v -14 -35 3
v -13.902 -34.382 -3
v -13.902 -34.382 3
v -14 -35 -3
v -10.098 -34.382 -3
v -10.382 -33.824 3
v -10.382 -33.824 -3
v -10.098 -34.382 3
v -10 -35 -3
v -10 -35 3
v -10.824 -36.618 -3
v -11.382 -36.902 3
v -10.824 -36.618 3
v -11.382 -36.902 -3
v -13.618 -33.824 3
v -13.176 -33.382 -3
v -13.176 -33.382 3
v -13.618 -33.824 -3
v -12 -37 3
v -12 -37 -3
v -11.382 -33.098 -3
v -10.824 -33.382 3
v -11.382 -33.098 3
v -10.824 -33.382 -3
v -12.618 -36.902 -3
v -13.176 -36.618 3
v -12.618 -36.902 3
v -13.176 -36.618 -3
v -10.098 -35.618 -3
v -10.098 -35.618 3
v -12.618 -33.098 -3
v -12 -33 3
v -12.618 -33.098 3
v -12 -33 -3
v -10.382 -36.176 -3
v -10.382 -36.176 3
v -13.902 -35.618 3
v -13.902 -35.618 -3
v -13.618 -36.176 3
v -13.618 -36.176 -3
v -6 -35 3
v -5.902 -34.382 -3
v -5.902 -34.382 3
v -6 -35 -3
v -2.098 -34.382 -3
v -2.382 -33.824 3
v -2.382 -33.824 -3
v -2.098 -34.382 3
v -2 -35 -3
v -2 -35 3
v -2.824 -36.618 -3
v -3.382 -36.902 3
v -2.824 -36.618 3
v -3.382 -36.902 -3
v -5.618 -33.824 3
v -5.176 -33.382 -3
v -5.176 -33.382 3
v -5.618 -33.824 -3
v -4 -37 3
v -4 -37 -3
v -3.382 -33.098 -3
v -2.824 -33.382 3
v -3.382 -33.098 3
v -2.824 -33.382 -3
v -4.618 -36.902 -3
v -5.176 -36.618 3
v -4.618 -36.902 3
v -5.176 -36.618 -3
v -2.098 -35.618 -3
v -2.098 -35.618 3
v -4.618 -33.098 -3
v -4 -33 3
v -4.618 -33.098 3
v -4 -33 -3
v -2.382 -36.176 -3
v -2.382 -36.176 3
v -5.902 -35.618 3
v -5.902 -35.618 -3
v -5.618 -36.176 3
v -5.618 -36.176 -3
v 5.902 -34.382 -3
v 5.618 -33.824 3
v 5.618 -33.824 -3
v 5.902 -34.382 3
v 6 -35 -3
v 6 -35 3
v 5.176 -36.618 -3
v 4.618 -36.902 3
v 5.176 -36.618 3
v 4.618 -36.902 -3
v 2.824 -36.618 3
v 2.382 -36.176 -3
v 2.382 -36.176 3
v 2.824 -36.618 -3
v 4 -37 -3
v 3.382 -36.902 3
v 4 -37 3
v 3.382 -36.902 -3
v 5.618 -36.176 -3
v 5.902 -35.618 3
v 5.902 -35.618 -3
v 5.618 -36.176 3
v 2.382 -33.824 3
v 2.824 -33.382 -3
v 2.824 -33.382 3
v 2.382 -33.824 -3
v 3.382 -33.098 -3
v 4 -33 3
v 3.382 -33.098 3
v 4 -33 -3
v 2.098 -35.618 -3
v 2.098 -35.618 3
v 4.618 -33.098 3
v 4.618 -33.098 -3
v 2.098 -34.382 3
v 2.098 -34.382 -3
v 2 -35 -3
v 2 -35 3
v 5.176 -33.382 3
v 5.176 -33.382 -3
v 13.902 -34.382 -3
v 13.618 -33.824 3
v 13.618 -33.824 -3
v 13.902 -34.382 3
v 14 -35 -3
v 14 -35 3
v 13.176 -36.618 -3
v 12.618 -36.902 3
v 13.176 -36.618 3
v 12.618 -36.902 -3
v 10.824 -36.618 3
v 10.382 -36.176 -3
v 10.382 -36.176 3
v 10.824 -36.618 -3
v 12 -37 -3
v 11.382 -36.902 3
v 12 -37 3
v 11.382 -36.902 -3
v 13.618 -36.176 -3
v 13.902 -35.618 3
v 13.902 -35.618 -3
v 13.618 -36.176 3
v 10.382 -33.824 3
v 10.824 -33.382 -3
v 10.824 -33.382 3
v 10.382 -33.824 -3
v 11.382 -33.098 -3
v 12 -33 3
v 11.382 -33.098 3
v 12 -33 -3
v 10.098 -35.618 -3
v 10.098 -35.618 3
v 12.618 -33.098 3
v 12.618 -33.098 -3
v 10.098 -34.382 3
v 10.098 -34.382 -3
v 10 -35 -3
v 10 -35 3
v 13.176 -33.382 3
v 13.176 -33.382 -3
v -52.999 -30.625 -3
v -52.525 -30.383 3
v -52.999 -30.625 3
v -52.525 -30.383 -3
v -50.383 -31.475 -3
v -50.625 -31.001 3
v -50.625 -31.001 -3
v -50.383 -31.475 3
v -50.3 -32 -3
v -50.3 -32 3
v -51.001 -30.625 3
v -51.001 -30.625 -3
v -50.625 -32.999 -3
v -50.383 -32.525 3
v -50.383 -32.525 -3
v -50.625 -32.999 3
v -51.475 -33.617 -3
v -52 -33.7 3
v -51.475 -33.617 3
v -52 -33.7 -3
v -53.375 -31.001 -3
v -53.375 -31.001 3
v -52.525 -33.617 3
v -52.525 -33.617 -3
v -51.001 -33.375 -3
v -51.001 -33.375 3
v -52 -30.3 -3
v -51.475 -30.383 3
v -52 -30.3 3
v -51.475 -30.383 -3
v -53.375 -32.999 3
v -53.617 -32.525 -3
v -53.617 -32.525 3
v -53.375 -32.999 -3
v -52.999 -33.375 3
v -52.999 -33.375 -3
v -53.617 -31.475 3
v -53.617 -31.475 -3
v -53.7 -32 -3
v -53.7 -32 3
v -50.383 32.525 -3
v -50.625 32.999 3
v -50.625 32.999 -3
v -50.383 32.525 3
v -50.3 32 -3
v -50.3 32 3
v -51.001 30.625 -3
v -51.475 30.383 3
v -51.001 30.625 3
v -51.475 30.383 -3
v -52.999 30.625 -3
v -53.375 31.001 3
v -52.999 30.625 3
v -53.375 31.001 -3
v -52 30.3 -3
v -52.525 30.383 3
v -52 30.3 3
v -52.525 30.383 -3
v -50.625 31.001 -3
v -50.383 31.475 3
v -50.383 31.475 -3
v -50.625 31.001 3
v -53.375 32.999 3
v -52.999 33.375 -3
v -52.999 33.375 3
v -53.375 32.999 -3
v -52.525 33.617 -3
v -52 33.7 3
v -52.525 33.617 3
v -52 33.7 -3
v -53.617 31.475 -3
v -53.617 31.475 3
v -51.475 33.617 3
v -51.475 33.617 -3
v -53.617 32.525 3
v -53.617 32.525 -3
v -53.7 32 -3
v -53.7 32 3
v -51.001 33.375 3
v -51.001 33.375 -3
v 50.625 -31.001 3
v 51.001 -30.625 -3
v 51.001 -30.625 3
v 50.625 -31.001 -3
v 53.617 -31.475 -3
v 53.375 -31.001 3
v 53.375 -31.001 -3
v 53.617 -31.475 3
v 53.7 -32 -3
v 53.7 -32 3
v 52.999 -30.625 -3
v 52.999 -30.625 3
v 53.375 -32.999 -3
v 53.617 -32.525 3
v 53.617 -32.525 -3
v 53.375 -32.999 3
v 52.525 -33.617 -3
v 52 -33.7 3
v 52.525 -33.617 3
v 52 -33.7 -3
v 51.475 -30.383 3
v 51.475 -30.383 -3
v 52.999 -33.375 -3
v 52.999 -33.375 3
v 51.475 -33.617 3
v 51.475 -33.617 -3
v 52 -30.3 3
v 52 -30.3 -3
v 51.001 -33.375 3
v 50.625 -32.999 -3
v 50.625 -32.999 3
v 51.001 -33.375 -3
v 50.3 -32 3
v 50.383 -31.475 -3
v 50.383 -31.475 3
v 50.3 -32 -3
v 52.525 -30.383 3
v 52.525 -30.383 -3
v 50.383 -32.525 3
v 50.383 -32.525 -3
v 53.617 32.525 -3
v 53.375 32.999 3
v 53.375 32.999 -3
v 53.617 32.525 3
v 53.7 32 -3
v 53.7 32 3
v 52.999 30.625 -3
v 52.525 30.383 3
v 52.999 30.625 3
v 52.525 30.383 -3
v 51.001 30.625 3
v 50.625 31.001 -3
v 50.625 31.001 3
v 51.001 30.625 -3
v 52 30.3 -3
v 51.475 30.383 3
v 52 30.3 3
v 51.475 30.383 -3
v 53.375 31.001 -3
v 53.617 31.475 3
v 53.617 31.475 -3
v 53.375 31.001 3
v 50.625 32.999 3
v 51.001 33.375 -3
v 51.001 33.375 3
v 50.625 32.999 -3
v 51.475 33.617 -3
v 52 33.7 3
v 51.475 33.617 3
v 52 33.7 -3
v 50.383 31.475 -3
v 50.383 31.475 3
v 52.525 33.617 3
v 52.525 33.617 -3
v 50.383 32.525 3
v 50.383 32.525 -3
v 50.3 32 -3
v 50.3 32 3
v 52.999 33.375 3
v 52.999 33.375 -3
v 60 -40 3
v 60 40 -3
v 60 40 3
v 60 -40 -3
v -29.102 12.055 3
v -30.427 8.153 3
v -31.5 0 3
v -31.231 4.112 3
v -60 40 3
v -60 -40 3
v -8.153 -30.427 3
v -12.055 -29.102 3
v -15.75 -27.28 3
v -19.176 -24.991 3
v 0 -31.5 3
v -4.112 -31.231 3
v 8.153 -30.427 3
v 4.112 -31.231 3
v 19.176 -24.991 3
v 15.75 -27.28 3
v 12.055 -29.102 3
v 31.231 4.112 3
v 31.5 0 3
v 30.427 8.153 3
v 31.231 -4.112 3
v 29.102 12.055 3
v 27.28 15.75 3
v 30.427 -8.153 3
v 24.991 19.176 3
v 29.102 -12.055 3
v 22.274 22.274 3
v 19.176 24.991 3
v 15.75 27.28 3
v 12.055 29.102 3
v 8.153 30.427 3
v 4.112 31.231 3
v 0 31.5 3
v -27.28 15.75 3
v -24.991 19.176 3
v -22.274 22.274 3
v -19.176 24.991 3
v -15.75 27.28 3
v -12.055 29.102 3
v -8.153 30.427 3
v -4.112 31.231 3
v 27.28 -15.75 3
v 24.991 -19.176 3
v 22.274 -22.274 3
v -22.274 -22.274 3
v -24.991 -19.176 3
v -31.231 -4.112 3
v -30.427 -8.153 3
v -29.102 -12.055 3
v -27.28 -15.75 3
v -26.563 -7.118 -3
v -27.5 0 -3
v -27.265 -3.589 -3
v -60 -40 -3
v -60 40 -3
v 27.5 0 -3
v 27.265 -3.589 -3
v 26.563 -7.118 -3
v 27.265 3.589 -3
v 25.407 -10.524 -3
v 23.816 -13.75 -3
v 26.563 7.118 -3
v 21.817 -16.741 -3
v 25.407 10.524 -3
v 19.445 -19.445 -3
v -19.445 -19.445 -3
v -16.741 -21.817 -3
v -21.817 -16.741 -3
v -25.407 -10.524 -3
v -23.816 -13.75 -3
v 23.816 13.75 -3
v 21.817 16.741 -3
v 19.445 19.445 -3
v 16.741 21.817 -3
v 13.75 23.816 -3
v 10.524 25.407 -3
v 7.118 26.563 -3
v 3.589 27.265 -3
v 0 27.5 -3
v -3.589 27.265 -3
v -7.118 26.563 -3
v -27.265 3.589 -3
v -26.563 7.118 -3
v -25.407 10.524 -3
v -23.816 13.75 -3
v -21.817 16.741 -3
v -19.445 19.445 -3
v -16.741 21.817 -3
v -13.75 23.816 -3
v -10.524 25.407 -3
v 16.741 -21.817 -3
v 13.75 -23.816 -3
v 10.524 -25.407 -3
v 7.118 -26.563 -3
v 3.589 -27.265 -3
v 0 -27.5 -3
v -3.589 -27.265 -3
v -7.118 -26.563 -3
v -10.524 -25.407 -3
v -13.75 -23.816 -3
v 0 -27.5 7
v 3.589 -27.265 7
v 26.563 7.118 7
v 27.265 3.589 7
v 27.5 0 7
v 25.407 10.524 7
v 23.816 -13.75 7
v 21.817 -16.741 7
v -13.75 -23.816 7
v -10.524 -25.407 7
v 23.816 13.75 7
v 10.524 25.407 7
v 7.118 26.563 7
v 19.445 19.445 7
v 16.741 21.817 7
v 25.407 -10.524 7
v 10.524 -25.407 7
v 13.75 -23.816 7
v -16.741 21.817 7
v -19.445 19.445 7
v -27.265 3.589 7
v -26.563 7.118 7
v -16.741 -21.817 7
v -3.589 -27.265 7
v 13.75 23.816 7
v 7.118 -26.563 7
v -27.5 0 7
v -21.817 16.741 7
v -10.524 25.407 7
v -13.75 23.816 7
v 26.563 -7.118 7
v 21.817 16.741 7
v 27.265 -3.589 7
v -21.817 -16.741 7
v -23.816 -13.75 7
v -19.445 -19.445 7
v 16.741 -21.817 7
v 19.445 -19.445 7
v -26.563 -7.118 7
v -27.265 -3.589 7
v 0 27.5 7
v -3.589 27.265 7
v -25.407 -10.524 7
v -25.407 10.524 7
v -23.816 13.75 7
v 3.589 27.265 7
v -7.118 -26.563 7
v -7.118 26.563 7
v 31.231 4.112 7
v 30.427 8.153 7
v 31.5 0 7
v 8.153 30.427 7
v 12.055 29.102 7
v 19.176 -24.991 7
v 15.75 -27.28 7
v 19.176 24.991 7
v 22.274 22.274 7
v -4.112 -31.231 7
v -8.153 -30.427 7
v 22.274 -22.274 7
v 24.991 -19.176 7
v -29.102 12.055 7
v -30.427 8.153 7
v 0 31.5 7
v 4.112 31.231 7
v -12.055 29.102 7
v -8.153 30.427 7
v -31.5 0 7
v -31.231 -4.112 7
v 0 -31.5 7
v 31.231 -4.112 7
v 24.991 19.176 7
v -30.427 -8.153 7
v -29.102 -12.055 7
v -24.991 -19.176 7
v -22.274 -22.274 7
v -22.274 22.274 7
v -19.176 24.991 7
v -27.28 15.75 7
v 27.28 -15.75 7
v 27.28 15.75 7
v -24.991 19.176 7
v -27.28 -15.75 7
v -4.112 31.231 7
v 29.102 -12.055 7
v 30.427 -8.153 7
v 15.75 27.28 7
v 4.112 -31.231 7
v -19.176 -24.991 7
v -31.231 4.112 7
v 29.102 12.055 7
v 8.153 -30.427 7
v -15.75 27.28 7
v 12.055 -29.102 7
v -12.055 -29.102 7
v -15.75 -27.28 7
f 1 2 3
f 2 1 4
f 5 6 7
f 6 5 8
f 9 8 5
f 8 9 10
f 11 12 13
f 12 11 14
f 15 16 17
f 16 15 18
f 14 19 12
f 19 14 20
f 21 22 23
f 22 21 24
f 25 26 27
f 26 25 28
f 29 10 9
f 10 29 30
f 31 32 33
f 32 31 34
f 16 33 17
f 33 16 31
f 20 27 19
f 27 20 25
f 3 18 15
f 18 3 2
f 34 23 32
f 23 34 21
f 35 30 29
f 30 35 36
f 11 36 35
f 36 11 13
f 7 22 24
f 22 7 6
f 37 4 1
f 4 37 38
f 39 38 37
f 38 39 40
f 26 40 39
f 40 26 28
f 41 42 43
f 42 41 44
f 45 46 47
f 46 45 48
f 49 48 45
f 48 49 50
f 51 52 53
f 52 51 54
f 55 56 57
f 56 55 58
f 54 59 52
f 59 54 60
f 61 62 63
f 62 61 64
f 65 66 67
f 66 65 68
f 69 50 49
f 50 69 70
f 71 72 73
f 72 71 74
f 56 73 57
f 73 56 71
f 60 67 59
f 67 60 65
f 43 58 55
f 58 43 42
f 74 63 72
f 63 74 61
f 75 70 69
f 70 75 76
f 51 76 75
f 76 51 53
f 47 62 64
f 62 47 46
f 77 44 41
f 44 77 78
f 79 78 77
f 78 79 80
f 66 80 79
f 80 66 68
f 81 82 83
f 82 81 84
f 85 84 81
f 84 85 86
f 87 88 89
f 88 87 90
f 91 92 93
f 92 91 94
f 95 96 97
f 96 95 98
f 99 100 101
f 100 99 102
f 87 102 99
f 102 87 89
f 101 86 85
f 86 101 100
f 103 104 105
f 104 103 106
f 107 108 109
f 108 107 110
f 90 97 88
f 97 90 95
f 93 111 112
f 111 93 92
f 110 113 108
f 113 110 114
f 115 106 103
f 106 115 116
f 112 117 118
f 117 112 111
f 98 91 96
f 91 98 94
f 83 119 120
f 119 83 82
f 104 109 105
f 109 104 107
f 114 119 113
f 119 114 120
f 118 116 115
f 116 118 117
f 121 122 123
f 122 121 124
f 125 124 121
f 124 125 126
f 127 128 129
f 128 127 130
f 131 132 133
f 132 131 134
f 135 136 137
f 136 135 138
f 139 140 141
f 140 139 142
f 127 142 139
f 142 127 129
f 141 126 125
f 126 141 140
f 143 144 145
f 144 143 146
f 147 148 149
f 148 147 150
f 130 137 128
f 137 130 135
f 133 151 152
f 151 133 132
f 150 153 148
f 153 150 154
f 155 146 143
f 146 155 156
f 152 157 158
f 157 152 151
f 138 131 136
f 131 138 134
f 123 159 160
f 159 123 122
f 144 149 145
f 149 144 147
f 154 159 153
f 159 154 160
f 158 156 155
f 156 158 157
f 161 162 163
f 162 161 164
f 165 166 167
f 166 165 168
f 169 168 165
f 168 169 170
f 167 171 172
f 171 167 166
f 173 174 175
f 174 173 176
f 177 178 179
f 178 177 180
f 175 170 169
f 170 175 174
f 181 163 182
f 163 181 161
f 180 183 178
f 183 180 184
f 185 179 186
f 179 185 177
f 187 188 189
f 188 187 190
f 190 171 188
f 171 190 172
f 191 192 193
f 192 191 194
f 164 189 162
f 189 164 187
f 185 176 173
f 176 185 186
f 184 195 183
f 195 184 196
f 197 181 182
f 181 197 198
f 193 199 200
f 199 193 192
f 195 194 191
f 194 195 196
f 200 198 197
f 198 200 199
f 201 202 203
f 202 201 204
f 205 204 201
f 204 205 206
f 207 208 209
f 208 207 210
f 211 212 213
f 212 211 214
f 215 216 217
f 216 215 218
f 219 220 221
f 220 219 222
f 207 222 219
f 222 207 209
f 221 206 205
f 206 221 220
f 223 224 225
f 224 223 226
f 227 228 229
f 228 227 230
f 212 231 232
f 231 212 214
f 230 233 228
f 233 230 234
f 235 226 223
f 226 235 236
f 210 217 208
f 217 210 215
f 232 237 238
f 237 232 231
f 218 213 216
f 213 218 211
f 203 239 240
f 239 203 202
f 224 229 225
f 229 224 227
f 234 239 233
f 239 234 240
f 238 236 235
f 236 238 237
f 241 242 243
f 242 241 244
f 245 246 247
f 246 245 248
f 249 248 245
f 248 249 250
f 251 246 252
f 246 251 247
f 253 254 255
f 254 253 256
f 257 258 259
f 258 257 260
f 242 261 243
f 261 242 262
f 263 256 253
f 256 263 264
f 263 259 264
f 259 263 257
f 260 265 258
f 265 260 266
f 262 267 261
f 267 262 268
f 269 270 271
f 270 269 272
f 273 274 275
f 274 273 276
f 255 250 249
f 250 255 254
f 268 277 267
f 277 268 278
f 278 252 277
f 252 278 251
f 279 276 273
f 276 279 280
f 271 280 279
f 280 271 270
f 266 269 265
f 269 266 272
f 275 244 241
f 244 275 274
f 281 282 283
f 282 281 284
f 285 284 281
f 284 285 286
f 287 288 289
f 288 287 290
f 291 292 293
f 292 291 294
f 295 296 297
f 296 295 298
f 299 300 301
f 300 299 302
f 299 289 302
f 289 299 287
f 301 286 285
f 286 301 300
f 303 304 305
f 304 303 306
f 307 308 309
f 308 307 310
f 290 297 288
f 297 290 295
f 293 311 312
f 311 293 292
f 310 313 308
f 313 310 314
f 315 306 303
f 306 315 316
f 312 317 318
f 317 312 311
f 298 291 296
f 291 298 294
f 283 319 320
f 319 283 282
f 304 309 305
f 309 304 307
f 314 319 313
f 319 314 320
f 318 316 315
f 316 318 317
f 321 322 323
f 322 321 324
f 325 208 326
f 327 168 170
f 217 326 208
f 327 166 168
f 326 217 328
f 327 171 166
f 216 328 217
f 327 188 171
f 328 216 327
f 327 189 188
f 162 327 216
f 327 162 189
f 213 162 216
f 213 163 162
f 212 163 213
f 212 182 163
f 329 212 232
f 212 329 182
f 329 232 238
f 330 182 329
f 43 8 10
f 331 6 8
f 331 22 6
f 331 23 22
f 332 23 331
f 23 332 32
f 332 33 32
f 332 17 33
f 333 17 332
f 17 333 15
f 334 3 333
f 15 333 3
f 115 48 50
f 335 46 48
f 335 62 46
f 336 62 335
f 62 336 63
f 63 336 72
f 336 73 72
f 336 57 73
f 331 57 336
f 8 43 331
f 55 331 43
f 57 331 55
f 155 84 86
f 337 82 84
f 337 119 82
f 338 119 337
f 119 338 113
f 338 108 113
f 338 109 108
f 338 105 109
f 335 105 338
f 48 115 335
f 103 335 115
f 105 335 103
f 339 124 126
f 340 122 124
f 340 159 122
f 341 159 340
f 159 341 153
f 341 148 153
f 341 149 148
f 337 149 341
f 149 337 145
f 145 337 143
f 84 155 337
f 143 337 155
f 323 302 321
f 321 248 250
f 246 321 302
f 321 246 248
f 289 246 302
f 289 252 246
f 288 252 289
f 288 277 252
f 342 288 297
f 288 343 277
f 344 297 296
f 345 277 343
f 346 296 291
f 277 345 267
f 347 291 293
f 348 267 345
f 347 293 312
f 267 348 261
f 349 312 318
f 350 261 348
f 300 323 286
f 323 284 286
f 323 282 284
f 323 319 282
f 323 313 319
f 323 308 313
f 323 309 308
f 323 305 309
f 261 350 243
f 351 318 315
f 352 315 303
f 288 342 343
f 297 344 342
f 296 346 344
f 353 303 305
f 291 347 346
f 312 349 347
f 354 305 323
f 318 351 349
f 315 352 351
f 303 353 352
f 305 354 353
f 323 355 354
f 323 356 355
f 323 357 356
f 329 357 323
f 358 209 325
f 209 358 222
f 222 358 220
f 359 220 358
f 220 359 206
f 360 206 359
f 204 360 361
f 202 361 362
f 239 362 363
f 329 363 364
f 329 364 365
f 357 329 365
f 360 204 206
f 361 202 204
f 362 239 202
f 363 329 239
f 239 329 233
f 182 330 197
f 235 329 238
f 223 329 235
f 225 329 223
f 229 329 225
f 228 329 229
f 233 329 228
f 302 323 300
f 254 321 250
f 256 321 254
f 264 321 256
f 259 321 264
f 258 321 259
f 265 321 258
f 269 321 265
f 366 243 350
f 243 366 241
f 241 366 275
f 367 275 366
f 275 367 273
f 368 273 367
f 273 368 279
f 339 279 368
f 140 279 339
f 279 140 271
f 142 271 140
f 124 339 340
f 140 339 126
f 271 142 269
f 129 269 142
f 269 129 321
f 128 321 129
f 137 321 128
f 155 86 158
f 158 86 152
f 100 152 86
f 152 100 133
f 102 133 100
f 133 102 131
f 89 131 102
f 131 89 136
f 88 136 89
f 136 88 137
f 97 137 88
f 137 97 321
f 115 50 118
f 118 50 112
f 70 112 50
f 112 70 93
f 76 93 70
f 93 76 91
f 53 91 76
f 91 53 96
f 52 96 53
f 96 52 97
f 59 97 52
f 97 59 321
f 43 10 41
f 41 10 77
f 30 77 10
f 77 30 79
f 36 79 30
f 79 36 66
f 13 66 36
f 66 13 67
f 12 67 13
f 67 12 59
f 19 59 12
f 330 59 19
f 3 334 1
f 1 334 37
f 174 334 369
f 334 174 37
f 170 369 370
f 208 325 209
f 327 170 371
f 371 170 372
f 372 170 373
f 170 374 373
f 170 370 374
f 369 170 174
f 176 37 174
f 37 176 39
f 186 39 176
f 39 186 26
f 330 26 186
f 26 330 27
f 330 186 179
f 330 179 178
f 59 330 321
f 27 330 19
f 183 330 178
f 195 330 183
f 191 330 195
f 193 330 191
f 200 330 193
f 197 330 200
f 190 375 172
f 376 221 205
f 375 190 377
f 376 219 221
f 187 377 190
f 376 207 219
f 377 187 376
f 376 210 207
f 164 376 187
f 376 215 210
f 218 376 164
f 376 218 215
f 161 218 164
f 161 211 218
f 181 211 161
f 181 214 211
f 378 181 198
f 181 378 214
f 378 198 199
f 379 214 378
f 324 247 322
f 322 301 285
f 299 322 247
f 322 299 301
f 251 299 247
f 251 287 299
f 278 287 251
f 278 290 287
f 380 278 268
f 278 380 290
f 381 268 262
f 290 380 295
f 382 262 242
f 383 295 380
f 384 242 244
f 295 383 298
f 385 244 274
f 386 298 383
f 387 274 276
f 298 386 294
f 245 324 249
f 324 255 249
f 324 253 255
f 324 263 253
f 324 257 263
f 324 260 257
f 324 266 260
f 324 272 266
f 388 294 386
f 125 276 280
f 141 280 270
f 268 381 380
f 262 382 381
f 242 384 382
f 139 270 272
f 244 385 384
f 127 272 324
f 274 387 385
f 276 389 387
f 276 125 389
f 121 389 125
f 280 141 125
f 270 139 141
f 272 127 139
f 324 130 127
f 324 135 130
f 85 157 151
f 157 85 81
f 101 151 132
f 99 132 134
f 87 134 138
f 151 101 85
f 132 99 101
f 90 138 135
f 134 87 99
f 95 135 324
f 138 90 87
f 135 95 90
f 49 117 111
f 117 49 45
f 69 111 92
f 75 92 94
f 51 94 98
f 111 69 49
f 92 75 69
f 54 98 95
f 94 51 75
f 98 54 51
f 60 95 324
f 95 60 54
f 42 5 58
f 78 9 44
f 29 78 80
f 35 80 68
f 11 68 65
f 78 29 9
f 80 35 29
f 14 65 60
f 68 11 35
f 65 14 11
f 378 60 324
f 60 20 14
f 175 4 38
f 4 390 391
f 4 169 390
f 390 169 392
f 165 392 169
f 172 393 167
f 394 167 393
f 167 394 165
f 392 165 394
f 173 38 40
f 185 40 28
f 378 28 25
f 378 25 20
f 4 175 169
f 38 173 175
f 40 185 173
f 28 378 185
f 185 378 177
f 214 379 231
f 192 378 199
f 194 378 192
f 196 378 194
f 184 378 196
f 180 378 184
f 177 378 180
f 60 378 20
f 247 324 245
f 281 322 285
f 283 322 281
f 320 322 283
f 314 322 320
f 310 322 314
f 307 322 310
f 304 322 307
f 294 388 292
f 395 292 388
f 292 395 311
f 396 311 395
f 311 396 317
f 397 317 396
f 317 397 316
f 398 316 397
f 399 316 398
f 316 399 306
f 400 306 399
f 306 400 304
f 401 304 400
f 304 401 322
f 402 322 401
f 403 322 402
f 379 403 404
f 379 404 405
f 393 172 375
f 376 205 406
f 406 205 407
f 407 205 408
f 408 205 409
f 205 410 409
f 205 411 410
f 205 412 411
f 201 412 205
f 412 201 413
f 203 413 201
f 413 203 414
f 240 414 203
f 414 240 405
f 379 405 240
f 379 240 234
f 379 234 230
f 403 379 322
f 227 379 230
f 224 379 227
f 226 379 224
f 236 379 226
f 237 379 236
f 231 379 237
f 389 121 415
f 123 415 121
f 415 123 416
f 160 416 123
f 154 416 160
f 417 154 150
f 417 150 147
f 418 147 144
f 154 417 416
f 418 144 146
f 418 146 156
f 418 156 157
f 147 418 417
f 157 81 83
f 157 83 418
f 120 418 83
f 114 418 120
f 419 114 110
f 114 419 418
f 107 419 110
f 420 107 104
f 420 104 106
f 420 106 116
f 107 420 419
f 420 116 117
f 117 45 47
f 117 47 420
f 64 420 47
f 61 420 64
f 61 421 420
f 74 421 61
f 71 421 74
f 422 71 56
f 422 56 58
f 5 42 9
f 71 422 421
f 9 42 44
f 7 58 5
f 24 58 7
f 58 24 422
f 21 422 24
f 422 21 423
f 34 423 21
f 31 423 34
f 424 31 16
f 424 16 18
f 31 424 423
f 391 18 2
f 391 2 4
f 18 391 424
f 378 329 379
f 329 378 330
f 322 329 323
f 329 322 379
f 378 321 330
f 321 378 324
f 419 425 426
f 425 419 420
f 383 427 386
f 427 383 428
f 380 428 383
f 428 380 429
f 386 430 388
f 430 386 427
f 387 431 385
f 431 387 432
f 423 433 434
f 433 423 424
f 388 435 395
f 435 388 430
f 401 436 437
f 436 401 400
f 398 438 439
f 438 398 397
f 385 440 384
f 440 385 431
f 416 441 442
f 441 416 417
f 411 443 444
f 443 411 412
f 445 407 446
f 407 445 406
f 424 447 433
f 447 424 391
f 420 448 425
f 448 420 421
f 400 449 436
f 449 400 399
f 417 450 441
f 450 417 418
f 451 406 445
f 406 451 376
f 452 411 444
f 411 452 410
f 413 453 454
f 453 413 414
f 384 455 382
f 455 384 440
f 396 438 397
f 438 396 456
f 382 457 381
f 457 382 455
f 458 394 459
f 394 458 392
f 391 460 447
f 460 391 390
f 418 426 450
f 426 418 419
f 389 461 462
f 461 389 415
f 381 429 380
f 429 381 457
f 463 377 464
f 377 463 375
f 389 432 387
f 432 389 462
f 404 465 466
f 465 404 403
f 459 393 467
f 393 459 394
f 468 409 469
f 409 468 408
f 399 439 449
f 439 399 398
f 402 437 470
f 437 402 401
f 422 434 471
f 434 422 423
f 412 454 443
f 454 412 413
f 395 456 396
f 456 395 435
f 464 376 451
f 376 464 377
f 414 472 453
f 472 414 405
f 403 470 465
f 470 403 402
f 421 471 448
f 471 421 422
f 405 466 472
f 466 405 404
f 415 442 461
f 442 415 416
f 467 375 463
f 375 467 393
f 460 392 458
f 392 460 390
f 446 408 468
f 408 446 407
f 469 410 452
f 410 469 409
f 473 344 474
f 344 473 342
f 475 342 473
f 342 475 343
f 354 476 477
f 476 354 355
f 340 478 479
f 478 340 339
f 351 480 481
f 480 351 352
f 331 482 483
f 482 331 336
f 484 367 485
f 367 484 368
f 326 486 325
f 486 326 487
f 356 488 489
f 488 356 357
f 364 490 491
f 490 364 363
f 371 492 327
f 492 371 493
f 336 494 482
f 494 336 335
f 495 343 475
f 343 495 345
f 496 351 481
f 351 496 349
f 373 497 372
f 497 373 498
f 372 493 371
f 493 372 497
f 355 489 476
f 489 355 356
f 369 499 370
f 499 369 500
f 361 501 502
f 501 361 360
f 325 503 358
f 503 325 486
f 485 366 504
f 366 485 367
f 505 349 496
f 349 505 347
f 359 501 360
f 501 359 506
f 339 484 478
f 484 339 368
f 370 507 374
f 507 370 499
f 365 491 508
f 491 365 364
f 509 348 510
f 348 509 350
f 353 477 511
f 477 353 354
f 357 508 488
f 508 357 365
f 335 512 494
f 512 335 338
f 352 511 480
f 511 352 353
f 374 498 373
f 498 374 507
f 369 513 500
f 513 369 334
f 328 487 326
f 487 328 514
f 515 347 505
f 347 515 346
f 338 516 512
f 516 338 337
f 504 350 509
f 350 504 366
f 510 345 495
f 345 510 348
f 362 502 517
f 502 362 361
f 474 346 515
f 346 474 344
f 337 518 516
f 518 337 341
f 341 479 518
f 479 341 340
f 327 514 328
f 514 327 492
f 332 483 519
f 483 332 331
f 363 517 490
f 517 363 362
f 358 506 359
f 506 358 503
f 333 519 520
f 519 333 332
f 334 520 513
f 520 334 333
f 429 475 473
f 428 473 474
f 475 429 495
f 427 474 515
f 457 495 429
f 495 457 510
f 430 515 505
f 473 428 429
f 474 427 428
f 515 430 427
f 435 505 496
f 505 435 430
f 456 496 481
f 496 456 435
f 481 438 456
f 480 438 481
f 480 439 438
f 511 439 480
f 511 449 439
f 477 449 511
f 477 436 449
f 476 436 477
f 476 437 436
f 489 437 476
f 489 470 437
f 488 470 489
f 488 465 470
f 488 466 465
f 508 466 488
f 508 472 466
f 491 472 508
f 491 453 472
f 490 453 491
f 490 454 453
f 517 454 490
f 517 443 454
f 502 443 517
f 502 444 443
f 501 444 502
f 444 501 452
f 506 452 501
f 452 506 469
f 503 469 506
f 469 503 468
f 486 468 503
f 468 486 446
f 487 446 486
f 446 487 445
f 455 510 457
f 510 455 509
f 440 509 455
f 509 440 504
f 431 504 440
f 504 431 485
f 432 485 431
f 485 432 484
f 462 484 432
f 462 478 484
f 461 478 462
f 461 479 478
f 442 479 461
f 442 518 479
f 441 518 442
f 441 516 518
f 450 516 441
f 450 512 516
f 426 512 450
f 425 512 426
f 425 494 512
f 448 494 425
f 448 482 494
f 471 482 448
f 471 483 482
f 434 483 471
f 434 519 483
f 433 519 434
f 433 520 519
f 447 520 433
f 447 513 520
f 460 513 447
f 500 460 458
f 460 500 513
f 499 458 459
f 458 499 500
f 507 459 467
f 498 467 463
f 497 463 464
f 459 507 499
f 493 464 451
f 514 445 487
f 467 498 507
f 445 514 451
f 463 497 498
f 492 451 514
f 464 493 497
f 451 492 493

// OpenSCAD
// Parametric configuration programming dock for the MyZubster robot.
// Holds the child robot in alignment while the auto-config firmware runs.
// Issue #81 task: Implementare API di configurazione.
// Print in PETG, 50% infill.

// Parameters (mm)
dock_l = 120;
dock_w = 80;
dock_h = 6;
child_cradle_d = 55;
child_cradle_depth = 12;
probe_dia = 4;
probe_count = 4;
bolt_dia = 3.4;
$fn = 48;

module config_dock() {
  difference() {
    cube([dock_l, dock_w, dock_h], center = true);
    // child robot cradle
    cylinder(h = child_cradle_depth, d = child_cradle_d, center = true);
    // programming probes (serial TX/RX/GND/VCC)
    for (i = [0 : probe_count - 1])
      translate([(i - (probe_count - 1) / 2) * 8, -dock_w / 2 + 5, 0])
        cylinder(h = dock_h + 2, d = probe_dia, $fn = 20, center = true);
    // corner mount bolts
    for (sx = [-1, 1], sy = [-1, 1])
      translate([sx * (dock_l / 2 - 8), sy * (dock_w / 2 - 8), 0])
        cylinder(h = dock_h + 2, d = bolt_dia, $fn = 20, center = true);
  }
  // cradle lip
  translate([0, 0, dock_h / 2])
    difference() {
      cylinder(h = 4, d = child_cradle_d + 8);
      cylinder(h = 4, d = child_cradle_d);
    }
}

config_dock();
